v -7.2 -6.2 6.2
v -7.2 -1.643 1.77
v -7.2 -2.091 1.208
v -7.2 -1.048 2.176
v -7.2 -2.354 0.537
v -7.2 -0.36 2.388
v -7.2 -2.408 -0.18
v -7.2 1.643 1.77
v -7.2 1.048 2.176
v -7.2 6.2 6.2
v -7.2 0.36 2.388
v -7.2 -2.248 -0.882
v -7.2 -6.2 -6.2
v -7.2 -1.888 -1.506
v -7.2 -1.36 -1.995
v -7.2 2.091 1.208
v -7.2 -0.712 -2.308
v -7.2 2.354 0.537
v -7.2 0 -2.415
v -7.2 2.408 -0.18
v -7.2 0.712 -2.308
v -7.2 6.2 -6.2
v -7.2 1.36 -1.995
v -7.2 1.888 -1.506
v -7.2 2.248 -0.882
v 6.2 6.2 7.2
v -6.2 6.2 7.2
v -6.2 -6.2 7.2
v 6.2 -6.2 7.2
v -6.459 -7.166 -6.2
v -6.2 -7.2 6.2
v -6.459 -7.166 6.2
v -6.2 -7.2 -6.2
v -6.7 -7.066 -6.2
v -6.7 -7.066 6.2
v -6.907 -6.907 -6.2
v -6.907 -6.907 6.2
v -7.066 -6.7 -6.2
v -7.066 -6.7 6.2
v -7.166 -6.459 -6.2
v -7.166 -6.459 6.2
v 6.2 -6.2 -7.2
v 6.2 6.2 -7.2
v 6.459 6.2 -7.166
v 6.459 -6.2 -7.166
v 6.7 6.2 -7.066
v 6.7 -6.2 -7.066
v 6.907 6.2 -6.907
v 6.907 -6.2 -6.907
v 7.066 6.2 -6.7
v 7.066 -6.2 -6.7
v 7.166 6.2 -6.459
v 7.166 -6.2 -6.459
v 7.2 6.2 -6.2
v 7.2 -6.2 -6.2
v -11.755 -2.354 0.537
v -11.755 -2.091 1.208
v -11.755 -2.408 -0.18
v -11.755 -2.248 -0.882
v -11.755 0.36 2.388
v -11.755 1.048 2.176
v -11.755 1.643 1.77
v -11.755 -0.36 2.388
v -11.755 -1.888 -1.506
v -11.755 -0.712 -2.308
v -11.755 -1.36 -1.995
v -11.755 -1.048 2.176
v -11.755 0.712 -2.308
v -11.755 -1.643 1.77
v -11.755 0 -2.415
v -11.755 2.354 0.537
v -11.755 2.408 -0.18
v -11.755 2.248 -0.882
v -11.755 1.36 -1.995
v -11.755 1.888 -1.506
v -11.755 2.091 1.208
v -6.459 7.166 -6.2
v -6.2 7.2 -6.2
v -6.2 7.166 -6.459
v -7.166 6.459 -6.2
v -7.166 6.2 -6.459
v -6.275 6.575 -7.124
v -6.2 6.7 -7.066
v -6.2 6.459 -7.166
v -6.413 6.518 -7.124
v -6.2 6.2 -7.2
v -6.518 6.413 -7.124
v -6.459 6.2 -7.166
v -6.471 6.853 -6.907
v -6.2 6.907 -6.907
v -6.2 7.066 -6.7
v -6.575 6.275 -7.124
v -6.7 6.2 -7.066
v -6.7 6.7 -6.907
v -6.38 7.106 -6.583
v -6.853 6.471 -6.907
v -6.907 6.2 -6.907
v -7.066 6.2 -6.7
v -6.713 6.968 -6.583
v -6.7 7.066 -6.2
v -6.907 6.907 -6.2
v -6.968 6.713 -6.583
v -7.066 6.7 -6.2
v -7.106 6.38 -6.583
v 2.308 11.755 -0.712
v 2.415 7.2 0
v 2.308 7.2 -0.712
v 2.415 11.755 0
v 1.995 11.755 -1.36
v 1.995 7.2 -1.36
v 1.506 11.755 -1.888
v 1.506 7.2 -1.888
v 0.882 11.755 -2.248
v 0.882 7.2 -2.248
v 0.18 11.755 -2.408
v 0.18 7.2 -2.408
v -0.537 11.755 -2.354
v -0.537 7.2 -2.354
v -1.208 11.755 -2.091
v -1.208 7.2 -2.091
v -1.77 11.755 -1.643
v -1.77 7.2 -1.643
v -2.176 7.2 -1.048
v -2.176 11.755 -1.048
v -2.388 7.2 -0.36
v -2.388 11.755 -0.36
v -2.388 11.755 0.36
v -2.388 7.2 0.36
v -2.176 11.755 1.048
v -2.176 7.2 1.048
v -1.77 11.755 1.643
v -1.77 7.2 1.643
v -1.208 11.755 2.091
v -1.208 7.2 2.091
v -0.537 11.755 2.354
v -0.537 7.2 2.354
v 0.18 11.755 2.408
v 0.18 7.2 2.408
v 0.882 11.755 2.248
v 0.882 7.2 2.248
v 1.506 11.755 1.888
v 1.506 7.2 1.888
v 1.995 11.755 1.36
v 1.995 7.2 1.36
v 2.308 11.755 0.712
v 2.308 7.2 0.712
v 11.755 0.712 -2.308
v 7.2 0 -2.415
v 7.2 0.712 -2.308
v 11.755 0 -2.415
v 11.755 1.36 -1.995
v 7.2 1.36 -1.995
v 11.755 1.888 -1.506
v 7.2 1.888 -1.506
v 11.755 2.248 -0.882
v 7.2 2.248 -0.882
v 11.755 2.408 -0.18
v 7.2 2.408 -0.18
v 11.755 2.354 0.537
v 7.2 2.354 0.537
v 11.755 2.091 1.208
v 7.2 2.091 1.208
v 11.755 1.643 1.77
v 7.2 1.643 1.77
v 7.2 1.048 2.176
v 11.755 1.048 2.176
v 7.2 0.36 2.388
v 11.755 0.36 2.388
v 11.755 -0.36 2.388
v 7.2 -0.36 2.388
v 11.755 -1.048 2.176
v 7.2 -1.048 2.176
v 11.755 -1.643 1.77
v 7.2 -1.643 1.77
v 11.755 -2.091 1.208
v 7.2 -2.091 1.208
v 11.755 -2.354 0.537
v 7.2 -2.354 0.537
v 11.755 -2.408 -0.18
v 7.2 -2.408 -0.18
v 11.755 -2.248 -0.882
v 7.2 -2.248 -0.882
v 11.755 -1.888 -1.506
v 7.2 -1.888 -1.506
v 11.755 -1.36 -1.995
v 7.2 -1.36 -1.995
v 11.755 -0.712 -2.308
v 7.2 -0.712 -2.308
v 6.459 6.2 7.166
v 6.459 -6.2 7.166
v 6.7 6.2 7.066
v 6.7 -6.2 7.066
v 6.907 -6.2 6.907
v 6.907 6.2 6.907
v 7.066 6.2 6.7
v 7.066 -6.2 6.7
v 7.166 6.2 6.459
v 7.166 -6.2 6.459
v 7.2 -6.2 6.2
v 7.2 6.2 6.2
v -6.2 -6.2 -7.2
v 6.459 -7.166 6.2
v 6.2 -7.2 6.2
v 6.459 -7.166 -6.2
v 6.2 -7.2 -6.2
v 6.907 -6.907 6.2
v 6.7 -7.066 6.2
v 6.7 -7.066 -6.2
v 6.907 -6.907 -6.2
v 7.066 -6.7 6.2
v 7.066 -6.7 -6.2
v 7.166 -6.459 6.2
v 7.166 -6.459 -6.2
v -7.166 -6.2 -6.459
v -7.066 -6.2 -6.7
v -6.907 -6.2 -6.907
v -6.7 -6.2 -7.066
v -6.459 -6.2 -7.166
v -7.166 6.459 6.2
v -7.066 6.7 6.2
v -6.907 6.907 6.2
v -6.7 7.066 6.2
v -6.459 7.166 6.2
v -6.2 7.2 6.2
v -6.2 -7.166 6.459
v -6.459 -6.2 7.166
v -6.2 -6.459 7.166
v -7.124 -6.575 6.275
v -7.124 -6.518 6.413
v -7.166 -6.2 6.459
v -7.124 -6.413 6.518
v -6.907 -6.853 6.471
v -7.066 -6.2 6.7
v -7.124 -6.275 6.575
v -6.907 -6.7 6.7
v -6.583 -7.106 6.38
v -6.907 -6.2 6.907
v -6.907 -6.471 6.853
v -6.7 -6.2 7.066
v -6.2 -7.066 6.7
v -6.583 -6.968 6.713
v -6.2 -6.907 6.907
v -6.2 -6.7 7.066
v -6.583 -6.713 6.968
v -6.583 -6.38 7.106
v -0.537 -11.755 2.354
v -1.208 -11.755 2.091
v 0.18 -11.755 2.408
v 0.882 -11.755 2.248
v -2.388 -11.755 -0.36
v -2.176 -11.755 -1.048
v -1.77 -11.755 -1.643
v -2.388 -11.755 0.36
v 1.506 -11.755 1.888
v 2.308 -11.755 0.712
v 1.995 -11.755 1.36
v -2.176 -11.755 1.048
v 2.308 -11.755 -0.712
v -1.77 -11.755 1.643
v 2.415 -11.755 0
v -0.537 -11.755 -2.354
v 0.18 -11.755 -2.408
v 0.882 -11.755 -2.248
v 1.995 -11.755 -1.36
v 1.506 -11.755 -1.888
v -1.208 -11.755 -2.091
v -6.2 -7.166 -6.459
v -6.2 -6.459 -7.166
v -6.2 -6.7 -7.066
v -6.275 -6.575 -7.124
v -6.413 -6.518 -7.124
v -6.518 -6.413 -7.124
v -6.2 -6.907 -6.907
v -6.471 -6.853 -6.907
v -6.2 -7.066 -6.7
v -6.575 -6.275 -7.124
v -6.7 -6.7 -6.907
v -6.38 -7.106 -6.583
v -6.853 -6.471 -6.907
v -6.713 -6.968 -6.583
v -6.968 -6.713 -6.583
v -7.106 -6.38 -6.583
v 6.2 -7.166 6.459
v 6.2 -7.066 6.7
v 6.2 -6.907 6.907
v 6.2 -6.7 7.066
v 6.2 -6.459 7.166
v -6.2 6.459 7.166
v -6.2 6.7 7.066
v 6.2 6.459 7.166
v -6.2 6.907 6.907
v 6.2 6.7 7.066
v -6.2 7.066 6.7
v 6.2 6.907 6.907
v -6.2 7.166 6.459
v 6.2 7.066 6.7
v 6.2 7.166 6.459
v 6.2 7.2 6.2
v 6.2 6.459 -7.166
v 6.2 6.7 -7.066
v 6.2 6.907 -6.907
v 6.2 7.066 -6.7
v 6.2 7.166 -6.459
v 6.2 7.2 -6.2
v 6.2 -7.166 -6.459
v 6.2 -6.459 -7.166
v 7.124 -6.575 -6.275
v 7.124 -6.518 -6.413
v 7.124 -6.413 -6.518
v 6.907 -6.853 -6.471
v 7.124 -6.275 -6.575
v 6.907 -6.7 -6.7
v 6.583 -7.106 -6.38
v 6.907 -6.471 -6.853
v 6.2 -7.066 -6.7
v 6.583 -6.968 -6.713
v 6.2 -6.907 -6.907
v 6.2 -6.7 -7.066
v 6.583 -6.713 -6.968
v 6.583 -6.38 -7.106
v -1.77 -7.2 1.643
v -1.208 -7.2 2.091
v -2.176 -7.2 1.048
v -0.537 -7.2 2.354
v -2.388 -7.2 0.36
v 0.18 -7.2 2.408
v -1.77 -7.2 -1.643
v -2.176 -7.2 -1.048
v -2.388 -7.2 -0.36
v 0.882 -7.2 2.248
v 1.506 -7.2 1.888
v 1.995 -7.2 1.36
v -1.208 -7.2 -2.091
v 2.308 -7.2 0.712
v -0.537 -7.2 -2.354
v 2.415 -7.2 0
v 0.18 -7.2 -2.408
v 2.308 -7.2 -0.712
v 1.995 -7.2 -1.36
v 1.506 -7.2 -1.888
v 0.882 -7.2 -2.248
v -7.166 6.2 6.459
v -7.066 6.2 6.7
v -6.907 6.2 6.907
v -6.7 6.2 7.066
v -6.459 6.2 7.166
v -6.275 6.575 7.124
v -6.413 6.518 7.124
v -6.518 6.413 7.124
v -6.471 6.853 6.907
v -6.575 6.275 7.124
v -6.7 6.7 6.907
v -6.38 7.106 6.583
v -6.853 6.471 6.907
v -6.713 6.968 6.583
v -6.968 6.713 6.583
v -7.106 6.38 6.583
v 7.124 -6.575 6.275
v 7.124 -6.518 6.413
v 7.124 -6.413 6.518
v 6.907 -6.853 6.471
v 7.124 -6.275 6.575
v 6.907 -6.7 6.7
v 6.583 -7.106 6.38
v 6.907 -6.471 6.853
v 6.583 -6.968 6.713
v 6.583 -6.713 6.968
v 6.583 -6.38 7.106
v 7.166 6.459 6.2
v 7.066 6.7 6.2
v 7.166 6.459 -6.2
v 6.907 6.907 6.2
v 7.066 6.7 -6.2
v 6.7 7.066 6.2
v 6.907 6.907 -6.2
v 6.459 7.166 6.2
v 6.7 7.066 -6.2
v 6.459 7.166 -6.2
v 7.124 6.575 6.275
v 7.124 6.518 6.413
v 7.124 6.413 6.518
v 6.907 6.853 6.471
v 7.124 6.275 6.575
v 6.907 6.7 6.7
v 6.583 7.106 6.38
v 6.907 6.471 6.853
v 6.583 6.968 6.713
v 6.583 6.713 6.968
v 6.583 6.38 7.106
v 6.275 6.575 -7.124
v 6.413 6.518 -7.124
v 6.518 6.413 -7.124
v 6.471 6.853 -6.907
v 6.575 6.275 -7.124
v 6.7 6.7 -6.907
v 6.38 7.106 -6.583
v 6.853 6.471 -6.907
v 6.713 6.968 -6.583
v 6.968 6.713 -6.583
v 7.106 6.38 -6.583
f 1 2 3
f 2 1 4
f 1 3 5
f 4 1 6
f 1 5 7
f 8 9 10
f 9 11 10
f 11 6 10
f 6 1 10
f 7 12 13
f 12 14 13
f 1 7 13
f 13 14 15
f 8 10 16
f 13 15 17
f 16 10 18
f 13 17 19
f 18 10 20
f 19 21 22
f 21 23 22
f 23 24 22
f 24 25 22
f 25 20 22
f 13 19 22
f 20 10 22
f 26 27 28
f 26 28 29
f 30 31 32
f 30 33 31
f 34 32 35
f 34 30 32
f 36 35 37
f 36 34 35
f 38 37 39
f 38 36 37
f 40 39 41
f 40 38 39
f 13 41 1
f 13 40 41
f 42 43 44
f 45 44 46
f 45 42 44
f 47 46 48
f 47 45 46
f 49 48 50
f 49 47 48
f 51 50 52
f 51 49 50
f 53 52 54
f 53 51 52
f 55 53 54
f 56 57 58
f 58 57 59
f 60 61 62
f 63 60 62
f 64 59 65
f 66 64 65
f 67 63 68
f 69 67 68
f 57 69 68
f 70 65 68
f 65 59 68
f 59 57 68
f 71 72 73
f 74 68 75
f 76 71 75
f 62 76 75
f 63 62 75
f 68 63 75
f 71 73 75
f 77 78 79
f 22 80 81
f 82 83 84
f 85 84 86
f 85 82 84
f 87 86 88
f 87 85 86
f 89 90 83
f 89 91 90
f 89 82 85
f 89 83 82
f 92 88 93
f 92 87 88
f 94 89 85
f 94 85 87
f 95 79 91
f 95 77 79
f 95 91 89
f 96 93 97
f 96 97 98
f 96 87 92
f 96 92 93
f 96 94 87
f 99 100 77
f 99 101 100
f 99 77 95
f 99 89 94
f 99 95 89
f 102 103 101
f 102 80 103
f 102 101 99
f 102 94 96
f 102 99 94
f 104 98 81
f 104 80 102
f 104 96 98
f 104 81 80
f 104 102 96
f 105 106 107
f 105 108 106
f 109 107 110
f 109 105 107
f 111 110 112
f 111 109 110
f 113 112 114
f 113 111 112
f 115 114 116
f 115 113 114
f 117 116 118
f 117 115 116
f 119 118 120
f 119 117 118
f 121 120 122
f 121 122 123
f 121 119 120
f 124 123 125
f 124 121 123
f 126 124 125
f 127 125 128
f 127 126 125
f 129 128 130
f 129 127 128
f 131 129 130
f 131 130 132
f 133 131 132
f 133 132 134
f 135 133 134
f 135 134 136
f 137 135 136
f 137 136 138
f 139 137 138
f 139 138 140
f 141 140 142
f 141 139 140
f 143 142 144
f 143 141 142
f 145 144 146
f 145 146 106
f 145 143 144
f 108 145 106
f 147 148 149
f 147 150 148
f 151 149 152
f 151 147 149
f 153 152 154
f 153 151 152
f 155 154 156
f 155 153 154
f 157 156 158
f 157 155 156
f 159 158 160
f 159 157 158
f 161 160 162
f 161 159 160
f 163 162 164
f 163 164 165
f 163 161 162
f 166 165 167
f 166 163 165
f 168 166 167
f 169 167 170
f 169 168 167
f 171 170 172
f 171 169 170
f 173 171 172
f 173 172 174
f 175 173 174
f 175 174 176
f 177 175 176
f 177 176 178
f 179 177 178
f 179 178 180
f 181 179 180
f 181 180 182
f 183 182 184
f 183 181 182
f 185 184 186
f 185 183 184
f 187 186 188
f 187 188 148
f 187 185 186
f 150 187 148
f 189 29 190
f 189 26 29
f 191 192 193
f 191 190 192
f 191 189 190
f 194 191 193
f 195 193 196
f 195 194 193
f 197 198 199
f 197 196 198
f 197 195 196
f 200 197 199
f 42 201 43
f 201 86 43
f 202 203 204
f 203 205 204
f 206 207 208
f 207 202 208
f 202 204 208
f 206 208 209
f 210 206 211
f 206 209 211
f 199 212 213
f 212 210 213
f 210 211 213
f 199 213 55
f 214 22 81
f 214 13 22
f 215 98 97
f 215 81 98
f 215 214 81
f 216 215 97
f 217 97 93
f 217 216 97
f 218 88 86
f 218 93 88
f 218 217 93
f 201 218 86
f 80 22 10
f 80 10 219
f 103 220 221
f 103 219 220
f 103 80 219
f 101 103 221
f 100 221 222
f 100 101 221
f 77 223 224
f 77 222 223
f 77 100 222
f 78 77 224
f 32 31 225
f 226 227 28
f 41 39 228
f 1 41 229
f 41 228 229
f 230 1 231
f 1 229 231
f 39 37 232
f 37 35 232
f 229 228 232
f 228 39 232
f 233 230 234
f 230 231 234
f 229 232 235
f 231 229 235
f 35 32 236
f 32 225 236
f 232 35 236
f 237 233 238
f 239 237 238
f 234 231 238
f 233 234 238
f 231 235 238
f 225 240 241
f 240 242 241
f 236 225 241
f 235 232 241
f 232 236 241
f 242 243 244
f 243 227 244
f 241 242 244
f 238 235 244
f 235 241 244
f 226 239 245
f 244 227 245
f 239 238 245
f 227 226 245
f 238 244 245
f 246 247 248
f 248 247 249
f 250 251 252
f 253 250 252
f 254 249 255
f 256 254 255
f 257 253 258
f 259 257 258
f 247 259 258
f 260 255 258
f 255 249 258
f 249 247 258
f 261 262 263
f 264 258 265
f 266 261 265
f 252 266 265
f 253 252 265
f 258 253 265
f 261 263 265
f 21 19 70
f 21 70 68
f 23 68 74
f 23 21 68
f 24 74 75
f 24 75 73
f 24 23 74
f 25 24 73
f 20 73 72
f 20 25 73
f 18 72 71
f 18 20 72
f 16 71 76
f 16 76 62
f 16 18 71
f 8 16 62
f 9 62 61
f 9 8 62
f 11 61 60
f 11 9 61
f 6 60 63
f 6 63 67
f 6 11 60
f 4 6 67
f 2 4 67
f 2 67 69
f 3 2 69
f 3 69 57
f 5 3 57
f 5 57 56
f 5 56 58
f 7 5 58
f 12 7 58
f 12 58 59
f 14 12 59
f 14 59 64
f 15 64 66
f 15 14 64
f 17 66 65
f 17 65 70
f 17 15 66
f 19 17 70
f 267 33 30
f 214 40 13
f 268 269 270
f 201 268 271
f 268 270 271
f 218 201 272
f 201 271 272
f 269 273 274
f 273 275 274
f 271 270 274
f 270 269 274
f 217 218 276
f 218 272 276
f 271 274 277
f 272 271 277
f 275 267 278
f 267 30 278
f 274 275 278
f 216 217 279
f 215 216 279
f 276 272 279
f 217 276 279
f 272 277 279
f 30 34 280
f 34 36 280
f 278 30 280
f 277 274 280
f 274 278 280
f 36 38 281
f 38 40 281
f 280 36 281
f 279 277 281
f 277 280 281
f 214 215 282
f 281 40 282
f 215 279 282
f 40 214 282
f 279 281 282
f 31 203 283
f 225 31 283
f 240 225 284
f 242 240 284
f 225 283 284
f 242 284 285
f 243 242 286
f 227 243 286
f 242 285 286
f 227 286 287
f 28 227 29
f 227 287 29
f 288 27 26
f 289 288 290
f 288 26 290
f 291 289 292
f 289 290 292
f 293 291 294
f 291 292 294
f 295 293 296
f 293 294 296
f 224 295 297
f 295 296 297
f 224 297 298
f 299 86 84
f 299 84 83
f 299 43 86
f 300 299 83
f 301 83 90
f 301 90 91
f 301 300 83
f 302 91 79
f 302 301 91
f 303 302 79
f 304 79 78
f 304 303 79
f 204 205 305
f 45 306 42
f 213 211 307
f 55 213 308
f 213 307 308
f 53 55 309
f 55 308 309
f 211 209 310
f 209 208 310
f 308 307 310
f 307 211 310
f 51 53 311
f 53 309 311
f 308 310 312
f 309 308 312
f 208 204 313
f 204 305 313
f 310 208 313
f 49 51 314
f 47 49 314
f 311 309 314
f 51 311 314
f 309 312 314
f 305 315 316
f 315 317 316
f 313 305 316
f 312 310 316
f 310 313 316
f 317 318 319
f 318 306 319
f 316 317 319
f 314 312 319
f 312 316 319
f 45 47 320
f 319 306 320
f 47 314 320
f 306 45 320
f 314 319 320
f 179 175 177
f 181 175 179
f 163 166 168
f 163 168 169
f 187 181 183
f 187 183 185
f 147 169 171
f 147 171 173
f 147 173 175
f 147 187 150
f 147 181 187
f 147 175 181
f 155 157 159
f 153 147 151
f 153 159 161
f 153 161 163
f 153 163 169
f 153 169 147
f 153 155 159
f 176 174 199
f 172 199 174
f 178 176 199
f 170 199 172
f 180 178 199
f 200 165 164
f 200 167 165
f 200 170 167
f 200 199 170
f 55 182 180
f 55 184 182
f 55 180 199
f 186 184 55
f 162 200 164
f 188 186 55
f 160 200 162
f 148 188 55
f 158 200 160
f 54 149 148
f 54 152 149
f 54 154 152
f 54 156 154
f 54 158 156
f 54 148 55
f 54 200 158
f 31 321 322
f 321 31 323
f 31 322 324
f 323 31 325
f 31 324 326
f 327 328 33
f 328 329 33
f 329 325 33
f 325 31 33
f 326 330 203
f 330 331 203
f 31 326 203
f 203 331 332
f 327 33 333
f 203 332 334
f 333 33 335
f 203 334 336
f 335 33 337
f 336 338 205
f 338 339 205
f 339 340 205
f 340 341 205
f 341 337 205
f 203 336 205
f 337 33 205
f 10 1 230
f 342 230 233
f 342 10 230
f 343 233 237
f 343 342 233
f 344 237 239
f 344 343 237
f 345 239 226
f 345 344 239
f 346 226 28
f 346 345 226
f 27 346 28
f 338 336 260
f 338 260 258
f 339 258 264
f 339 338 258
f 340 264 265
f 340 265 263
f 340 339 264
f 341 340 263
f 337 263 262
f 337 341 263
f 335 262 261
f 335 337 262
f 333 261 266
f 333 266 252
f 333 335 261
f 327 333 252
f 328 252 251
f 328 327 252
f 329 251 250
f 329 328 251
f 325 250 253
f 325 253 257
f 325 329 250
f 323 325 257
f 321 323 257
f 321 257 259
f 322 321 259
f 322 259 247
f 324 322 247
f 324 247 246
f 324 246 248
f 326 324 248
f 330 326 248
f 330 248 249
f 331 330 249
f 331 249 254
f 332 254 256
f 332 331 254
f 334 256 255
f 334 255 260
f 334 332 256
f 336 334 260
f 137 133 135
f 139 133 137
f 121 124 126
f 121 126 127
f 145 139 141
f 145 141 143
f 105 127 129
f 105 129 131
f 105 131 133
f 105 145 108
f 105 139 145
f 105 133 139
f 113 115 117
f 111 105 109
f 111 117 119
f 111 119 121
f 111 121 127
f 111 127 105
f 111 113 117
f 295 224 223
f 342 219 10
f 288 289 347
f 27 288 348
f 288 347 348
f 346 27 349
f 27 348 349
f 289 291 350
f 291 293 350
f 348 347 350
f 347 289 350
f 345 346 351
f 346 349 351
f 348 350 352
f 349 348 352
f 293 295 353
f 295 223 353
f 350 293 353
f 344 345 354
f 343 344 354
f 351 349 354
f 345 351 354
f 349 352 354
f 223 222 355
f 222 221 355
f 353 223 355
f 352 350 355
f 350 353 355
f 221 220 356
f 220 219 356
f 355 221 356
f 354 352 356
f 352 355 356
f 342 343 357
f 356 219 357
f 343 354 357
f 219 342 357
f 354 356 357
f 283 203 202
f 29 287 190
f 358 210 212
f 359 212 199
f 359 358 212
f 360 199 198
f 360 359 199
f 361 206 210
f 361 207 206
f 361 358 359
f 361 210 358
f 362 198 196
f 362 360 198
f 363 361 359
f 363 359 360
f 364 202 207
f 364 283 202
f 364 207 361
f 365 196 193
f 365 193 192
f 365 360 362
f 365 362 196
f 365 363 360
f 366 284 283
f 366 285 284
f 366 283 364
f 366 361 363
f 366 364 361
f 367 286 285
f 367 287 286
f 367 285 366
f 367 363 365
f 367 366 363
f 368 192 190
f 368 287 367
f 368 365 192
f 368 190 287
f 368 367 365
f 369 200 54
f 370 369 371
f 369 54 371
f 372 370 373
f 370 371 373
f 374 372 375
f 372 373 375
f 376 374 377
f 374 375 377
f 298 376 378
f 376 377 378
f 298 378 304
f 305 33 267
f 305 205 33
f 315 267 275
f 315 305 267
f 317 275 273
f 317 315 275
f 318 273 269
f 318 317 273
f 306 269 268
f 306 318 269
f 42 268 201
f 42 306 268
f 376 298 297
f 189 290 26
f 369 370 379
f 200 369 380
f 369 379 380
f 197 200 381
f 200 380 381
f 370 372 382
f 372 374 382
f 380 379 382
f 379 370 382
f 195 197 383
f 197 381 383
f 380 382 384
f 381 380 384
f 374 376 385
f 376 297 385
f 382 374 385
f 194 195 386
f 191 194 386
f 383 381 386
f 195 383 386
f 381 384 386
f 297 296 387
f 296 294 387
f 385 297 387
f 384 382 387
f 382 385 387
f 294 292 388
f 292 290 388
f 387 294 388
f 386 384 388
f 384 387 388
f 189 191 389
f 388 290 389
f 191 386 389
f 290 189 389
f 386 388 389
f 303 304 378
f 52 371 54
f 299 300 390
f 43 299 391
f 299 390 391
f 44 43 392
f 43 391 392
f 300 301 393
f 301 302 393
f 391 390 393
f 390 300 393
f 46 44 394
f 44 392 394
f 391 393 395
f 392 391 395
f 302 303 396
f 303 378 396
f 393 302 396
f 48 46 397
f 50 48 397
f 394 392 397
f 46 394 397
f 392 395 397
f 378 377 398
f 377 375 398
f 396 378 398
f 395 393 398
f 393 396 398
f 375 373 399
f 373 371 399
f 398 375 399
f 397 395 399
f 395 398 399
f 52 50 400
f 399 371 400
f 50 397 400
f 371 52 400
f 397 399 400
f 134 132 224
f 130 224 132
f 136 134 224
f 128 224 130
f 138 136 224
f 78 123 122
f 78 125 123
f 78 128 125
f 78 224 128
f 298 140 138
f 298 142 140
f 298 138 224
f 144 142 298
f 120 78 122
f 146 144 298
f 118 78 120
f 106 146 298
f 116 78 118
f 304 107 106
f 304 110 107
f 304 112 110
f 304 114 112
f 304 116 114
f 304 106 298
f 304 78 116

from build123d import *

# Parameters (mm, degrees)
SKETCH1_W           = 14.4
SKETCH1_H           = 14.4
BOSS_EXTRUDE1_DEPTH = 7.2
SKETCH2_R           = 2.415
BOSS_EXTRUDE2_DEPTH = 11.755
SKETCH3_R           = 2.415
BOSS_EXTRUDE3_DEPTH = 11.755
FILLET2_R           = 1


with BuildPart() as part:
    # Sketch1 → Boss-Extrude1 (new body, symmetric)
    with BuildSketch(Plane(origin=(0, 0, 0), x_dir=(1, 0, 0), z_dir=(0, 1, 0))):
        Rectangle(SKETCH1_W, SKETCH1_H)
    extrude(amount=BOSS_EXTRUDE1_DEPTH, both=True)

    # Sketch2 → Boss-Extrude2 (add, symmetric)
    with BuildSketch(Plane(origin=(0, 0, 0), x_dir=(0, 0, -1), z_dir=(1, 0, 0))):
        Circle(SKETCH2_R)
    extrude(amount=BOSS_EXTRUDE2_DEPTH, both=True)

    # Sketch3 → Boss-Extrude3 (add, symmetric)
    with BuildSketch(Plane(origin=(0, 0, 0), x_dir=(1, 0, 0), z_dir=(0, 1, 0))):
        Circle(SKETCH3_R)
    extrude(amount=BOSS_EXTRUDE3_DEPTH, both=True)

    # Fillet2
    fillet2_edges = [part.edges().sort_by_distance(p)[0] for p in [
        (-7.2, 7.2, 0),
        (0, 7.2, 7.2),
        (7.2, 7.2, 0),
        (0, -7.2, 7.2),
        (-7.2, -7.2, 0),
        (0, -7.2, -7.2),
        (7.2, -7.2, 0),
        (0, 7.2, -7.2),
        (7.2, 0, 7.2),
        (-7.2, 0, 7.2),
        (-7.2, 0, -7.2),
        (7.2, 0, -7.2),
    ]]
    fillet(fillet2_edges, radius=FILLET2_R)


solid = part.part
